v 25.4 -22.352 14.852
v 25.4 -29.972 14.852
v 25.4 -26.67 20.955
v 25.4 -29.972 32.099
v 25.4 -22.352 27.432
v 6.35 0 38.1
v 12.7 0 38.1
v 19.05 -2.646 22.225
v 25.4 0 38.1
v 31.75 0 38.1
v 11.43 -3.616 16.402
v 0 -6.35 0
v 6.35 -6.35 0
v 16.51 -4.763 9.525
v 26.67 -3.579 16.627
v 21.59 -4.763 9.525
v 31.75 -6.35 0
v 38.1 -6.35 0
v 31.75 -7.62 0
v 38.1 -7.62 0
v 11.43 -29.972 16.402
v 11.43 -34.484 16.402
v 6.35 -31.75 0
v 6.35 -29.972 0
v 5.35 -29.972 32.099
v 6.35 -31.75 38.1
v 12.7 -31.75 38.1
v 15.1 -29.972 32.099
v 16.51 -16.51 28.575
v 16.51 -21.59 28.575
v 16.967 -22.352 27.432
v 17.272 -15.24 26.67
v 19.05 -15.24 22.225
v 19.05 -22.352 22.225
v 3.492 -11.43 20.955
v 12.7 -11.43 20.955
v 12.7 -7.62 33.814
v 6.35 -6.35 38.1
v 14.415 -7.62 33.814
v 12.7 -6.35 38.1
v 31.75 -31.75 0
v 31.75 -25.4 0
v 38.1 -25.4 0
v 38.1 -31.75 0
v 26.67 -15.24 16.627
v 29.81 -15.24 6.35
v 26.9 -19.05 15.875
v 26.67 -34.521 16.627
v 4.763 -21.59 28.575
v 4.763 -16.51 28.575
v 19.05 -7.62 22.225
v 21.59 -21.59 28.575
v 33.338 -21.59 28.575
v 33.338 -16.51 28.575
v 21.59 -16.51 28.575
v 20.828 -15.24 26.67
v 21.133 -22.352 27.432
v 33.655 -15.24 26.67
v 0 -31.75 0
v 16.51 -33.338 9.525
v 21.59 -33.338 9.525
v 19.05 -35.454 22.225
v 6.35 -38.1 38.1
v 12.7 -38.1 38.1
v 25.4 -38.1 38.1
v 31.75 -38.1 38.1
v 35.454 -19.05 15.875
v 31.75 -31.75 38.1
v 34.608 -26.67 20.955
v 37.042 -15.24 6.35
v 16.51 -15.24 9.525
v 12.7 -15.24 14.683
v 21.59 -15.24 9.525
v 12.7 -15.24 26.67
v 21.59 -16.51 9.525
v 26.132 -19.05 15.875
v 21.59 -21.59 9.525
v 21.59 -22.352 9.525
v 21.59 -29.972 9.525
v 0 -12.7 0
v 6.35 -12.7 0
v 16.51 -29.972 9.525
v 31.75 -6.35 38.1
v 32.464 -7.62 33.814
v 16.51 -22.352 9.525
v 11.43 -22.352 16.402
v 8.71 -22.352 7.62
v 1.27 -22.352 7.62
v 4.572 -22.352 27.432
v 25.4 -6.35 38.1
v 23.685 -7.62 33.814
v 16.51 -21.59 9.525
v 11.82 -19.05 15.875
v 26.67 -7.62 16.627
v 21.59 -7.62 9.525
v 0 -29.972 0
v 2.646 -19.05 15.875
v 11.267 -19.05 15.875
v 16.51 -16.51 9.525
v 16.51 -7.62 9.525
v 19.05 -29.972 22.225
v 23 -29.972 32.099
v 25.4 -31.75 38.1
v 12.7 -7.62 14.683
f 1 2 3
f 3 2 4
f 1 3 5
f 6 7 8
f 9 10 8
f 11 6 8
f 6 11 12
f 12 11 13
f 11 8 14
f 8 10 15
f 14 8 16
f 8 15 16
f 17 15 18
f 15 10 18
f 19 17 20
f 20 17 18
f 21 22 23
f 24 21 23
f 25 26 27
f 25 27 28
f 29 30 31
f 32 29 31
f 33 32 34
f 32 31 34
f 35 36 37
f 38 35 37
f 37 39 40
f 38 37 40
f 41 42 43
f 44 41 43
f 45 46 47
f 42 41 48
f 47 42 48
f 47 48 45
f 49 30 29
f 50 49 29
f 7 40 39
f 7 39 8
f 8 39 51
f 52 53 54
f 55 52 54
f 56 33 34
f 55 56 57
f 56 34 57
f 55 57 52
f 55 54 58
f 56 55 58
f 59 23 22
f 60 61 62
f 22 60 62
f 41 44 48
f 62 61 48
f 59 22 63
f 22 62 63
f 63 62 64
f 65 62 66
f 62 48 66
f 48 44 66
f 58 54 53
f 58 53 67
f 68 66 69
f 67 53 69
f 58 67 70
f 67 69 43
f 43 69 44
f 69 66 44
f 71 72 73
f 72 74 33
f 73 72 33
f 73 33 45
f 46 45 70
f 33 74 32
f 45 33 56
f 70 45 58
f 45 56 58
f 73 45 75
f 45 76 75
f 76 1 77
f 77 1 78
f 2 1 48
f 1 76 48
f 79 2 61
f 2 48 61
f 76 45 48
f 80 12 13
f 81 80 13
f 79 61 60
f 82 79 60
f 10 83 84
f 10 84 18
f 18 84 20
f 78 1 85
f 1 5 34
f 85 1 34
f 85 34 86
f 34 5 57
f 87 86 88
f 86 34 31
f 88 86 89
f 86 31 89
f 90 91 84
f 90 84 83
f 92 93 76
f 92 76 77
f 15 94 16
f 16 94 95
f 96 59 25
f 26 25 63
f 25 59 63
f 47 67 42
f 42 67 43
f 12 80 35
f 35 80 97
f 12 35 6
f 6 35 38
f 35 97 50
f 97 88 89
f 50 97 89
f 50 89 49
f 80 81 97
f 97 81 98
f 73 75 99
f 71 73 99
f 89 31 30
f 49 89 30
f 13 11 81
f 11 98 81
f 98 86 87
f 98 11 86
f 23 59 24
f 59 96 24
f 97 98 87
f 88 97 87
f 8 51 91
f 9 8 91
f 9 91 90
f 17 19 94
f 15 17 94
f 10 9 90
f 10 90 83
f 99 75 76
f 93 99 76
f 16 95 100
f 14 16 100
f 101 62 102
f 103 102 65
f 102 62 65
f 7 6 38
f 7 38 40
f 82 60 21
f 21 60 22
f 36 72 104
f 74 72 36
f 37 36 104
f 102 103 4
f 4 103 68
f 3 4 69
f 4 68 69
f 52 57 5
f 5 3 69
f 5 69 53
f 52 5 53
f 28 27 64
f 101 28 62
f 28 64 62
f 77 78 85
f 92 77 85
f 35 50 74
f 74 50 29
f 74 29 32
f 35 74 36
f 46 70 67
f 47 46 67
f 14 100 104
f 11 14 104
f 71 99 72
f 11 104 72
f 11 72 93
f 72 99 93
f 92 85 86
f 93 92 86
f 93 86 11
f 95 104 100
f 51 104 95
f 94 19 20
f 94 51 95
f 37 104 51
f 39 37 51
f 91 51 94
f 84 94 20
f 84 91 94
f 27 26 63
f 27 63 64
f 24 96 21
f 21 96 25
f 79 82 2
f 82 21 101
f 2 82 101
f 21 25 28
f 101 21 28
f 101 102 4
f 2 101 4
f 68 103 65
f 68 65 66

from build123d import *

# Parameters (mm, degrees)
F0_W      = 38.1
F0_H      = 38.1
F2_DEPTH  = 38.1
F6_DEPTH  = 38.1
F8_DEPTH  = 38.1
F9_W      = 25.4
F9_H      = 7.62
F10_DEPTH = 38.1


with BuildPart() as f2:
    # F0 (on Front) → F2 (new body)
    with BuildSketch(Plane.XZ):
        with Locations((19.05, 19.05)):
            Rectangle(F0_W, F0_H)
    extrude(amount=F2_DEPTH)

    # F5 (on offset) → F6 (cut)
    with BuildSketch(Plane.YZ.offset(38.1)):
        Polygon((-6.35, 38.1), (-31.75, 38.1), (-26.67, 20.955), (-21.59, 28.575), (-16.51, 28.575), (-11.43, 20.955), align=None)
        Polygon((0, 0), (0, 38.1), (-6.35, 0), align=None)
        Polygon((-19.05, 15.875), (-25.4, 0), (-12.7, 0), align=None)
        Polygon((-31.75, 0), (-38.1, 38.1), (-38.1, 0), align=None)
    extrude(amount=-F6_DEPTH, mode=Mode.SUBTRACT)

    # F7 (on offset) → F8 (cut)
    with BuildSketch(Plane.XZ.offset(38.1)):
        Polygon((0, 38.1), (0, 0), (6.35, 38.1), align=None)
        Polygon((11.43, 16.402483), (6.35, 0), (31.75, 0), (26.67, 16.627173), (21.59, 9.525), (16.51, 9.525), align=None)
        Polygon((25.4, 38.1), (12.7, 38.1), (19.05, 22.225), align=None)
        Polygon((31.75, 38.1), (38.1, 0), (38.1, 38.1), align=None)
    extrude(amount=-F8_DEPTH, mode=Mode.SUBTRACT)

    # F9 (on offset) → F10 (cut)
    with BuildSketch(Plane.XY.offset(38.1)):
        with Locations((25.4, -11.43)):
            Rectangle(F9_W, F9_H)
        Polygon((25.4, -22.352), (0, -22.352), (0, -29.972), (1.777999, -29.972), (25.4, -29.972), align=None)
    extrude(amount=-F10_DEPTH, mode=Mode.SUBTRACT)


solid = f2.part
